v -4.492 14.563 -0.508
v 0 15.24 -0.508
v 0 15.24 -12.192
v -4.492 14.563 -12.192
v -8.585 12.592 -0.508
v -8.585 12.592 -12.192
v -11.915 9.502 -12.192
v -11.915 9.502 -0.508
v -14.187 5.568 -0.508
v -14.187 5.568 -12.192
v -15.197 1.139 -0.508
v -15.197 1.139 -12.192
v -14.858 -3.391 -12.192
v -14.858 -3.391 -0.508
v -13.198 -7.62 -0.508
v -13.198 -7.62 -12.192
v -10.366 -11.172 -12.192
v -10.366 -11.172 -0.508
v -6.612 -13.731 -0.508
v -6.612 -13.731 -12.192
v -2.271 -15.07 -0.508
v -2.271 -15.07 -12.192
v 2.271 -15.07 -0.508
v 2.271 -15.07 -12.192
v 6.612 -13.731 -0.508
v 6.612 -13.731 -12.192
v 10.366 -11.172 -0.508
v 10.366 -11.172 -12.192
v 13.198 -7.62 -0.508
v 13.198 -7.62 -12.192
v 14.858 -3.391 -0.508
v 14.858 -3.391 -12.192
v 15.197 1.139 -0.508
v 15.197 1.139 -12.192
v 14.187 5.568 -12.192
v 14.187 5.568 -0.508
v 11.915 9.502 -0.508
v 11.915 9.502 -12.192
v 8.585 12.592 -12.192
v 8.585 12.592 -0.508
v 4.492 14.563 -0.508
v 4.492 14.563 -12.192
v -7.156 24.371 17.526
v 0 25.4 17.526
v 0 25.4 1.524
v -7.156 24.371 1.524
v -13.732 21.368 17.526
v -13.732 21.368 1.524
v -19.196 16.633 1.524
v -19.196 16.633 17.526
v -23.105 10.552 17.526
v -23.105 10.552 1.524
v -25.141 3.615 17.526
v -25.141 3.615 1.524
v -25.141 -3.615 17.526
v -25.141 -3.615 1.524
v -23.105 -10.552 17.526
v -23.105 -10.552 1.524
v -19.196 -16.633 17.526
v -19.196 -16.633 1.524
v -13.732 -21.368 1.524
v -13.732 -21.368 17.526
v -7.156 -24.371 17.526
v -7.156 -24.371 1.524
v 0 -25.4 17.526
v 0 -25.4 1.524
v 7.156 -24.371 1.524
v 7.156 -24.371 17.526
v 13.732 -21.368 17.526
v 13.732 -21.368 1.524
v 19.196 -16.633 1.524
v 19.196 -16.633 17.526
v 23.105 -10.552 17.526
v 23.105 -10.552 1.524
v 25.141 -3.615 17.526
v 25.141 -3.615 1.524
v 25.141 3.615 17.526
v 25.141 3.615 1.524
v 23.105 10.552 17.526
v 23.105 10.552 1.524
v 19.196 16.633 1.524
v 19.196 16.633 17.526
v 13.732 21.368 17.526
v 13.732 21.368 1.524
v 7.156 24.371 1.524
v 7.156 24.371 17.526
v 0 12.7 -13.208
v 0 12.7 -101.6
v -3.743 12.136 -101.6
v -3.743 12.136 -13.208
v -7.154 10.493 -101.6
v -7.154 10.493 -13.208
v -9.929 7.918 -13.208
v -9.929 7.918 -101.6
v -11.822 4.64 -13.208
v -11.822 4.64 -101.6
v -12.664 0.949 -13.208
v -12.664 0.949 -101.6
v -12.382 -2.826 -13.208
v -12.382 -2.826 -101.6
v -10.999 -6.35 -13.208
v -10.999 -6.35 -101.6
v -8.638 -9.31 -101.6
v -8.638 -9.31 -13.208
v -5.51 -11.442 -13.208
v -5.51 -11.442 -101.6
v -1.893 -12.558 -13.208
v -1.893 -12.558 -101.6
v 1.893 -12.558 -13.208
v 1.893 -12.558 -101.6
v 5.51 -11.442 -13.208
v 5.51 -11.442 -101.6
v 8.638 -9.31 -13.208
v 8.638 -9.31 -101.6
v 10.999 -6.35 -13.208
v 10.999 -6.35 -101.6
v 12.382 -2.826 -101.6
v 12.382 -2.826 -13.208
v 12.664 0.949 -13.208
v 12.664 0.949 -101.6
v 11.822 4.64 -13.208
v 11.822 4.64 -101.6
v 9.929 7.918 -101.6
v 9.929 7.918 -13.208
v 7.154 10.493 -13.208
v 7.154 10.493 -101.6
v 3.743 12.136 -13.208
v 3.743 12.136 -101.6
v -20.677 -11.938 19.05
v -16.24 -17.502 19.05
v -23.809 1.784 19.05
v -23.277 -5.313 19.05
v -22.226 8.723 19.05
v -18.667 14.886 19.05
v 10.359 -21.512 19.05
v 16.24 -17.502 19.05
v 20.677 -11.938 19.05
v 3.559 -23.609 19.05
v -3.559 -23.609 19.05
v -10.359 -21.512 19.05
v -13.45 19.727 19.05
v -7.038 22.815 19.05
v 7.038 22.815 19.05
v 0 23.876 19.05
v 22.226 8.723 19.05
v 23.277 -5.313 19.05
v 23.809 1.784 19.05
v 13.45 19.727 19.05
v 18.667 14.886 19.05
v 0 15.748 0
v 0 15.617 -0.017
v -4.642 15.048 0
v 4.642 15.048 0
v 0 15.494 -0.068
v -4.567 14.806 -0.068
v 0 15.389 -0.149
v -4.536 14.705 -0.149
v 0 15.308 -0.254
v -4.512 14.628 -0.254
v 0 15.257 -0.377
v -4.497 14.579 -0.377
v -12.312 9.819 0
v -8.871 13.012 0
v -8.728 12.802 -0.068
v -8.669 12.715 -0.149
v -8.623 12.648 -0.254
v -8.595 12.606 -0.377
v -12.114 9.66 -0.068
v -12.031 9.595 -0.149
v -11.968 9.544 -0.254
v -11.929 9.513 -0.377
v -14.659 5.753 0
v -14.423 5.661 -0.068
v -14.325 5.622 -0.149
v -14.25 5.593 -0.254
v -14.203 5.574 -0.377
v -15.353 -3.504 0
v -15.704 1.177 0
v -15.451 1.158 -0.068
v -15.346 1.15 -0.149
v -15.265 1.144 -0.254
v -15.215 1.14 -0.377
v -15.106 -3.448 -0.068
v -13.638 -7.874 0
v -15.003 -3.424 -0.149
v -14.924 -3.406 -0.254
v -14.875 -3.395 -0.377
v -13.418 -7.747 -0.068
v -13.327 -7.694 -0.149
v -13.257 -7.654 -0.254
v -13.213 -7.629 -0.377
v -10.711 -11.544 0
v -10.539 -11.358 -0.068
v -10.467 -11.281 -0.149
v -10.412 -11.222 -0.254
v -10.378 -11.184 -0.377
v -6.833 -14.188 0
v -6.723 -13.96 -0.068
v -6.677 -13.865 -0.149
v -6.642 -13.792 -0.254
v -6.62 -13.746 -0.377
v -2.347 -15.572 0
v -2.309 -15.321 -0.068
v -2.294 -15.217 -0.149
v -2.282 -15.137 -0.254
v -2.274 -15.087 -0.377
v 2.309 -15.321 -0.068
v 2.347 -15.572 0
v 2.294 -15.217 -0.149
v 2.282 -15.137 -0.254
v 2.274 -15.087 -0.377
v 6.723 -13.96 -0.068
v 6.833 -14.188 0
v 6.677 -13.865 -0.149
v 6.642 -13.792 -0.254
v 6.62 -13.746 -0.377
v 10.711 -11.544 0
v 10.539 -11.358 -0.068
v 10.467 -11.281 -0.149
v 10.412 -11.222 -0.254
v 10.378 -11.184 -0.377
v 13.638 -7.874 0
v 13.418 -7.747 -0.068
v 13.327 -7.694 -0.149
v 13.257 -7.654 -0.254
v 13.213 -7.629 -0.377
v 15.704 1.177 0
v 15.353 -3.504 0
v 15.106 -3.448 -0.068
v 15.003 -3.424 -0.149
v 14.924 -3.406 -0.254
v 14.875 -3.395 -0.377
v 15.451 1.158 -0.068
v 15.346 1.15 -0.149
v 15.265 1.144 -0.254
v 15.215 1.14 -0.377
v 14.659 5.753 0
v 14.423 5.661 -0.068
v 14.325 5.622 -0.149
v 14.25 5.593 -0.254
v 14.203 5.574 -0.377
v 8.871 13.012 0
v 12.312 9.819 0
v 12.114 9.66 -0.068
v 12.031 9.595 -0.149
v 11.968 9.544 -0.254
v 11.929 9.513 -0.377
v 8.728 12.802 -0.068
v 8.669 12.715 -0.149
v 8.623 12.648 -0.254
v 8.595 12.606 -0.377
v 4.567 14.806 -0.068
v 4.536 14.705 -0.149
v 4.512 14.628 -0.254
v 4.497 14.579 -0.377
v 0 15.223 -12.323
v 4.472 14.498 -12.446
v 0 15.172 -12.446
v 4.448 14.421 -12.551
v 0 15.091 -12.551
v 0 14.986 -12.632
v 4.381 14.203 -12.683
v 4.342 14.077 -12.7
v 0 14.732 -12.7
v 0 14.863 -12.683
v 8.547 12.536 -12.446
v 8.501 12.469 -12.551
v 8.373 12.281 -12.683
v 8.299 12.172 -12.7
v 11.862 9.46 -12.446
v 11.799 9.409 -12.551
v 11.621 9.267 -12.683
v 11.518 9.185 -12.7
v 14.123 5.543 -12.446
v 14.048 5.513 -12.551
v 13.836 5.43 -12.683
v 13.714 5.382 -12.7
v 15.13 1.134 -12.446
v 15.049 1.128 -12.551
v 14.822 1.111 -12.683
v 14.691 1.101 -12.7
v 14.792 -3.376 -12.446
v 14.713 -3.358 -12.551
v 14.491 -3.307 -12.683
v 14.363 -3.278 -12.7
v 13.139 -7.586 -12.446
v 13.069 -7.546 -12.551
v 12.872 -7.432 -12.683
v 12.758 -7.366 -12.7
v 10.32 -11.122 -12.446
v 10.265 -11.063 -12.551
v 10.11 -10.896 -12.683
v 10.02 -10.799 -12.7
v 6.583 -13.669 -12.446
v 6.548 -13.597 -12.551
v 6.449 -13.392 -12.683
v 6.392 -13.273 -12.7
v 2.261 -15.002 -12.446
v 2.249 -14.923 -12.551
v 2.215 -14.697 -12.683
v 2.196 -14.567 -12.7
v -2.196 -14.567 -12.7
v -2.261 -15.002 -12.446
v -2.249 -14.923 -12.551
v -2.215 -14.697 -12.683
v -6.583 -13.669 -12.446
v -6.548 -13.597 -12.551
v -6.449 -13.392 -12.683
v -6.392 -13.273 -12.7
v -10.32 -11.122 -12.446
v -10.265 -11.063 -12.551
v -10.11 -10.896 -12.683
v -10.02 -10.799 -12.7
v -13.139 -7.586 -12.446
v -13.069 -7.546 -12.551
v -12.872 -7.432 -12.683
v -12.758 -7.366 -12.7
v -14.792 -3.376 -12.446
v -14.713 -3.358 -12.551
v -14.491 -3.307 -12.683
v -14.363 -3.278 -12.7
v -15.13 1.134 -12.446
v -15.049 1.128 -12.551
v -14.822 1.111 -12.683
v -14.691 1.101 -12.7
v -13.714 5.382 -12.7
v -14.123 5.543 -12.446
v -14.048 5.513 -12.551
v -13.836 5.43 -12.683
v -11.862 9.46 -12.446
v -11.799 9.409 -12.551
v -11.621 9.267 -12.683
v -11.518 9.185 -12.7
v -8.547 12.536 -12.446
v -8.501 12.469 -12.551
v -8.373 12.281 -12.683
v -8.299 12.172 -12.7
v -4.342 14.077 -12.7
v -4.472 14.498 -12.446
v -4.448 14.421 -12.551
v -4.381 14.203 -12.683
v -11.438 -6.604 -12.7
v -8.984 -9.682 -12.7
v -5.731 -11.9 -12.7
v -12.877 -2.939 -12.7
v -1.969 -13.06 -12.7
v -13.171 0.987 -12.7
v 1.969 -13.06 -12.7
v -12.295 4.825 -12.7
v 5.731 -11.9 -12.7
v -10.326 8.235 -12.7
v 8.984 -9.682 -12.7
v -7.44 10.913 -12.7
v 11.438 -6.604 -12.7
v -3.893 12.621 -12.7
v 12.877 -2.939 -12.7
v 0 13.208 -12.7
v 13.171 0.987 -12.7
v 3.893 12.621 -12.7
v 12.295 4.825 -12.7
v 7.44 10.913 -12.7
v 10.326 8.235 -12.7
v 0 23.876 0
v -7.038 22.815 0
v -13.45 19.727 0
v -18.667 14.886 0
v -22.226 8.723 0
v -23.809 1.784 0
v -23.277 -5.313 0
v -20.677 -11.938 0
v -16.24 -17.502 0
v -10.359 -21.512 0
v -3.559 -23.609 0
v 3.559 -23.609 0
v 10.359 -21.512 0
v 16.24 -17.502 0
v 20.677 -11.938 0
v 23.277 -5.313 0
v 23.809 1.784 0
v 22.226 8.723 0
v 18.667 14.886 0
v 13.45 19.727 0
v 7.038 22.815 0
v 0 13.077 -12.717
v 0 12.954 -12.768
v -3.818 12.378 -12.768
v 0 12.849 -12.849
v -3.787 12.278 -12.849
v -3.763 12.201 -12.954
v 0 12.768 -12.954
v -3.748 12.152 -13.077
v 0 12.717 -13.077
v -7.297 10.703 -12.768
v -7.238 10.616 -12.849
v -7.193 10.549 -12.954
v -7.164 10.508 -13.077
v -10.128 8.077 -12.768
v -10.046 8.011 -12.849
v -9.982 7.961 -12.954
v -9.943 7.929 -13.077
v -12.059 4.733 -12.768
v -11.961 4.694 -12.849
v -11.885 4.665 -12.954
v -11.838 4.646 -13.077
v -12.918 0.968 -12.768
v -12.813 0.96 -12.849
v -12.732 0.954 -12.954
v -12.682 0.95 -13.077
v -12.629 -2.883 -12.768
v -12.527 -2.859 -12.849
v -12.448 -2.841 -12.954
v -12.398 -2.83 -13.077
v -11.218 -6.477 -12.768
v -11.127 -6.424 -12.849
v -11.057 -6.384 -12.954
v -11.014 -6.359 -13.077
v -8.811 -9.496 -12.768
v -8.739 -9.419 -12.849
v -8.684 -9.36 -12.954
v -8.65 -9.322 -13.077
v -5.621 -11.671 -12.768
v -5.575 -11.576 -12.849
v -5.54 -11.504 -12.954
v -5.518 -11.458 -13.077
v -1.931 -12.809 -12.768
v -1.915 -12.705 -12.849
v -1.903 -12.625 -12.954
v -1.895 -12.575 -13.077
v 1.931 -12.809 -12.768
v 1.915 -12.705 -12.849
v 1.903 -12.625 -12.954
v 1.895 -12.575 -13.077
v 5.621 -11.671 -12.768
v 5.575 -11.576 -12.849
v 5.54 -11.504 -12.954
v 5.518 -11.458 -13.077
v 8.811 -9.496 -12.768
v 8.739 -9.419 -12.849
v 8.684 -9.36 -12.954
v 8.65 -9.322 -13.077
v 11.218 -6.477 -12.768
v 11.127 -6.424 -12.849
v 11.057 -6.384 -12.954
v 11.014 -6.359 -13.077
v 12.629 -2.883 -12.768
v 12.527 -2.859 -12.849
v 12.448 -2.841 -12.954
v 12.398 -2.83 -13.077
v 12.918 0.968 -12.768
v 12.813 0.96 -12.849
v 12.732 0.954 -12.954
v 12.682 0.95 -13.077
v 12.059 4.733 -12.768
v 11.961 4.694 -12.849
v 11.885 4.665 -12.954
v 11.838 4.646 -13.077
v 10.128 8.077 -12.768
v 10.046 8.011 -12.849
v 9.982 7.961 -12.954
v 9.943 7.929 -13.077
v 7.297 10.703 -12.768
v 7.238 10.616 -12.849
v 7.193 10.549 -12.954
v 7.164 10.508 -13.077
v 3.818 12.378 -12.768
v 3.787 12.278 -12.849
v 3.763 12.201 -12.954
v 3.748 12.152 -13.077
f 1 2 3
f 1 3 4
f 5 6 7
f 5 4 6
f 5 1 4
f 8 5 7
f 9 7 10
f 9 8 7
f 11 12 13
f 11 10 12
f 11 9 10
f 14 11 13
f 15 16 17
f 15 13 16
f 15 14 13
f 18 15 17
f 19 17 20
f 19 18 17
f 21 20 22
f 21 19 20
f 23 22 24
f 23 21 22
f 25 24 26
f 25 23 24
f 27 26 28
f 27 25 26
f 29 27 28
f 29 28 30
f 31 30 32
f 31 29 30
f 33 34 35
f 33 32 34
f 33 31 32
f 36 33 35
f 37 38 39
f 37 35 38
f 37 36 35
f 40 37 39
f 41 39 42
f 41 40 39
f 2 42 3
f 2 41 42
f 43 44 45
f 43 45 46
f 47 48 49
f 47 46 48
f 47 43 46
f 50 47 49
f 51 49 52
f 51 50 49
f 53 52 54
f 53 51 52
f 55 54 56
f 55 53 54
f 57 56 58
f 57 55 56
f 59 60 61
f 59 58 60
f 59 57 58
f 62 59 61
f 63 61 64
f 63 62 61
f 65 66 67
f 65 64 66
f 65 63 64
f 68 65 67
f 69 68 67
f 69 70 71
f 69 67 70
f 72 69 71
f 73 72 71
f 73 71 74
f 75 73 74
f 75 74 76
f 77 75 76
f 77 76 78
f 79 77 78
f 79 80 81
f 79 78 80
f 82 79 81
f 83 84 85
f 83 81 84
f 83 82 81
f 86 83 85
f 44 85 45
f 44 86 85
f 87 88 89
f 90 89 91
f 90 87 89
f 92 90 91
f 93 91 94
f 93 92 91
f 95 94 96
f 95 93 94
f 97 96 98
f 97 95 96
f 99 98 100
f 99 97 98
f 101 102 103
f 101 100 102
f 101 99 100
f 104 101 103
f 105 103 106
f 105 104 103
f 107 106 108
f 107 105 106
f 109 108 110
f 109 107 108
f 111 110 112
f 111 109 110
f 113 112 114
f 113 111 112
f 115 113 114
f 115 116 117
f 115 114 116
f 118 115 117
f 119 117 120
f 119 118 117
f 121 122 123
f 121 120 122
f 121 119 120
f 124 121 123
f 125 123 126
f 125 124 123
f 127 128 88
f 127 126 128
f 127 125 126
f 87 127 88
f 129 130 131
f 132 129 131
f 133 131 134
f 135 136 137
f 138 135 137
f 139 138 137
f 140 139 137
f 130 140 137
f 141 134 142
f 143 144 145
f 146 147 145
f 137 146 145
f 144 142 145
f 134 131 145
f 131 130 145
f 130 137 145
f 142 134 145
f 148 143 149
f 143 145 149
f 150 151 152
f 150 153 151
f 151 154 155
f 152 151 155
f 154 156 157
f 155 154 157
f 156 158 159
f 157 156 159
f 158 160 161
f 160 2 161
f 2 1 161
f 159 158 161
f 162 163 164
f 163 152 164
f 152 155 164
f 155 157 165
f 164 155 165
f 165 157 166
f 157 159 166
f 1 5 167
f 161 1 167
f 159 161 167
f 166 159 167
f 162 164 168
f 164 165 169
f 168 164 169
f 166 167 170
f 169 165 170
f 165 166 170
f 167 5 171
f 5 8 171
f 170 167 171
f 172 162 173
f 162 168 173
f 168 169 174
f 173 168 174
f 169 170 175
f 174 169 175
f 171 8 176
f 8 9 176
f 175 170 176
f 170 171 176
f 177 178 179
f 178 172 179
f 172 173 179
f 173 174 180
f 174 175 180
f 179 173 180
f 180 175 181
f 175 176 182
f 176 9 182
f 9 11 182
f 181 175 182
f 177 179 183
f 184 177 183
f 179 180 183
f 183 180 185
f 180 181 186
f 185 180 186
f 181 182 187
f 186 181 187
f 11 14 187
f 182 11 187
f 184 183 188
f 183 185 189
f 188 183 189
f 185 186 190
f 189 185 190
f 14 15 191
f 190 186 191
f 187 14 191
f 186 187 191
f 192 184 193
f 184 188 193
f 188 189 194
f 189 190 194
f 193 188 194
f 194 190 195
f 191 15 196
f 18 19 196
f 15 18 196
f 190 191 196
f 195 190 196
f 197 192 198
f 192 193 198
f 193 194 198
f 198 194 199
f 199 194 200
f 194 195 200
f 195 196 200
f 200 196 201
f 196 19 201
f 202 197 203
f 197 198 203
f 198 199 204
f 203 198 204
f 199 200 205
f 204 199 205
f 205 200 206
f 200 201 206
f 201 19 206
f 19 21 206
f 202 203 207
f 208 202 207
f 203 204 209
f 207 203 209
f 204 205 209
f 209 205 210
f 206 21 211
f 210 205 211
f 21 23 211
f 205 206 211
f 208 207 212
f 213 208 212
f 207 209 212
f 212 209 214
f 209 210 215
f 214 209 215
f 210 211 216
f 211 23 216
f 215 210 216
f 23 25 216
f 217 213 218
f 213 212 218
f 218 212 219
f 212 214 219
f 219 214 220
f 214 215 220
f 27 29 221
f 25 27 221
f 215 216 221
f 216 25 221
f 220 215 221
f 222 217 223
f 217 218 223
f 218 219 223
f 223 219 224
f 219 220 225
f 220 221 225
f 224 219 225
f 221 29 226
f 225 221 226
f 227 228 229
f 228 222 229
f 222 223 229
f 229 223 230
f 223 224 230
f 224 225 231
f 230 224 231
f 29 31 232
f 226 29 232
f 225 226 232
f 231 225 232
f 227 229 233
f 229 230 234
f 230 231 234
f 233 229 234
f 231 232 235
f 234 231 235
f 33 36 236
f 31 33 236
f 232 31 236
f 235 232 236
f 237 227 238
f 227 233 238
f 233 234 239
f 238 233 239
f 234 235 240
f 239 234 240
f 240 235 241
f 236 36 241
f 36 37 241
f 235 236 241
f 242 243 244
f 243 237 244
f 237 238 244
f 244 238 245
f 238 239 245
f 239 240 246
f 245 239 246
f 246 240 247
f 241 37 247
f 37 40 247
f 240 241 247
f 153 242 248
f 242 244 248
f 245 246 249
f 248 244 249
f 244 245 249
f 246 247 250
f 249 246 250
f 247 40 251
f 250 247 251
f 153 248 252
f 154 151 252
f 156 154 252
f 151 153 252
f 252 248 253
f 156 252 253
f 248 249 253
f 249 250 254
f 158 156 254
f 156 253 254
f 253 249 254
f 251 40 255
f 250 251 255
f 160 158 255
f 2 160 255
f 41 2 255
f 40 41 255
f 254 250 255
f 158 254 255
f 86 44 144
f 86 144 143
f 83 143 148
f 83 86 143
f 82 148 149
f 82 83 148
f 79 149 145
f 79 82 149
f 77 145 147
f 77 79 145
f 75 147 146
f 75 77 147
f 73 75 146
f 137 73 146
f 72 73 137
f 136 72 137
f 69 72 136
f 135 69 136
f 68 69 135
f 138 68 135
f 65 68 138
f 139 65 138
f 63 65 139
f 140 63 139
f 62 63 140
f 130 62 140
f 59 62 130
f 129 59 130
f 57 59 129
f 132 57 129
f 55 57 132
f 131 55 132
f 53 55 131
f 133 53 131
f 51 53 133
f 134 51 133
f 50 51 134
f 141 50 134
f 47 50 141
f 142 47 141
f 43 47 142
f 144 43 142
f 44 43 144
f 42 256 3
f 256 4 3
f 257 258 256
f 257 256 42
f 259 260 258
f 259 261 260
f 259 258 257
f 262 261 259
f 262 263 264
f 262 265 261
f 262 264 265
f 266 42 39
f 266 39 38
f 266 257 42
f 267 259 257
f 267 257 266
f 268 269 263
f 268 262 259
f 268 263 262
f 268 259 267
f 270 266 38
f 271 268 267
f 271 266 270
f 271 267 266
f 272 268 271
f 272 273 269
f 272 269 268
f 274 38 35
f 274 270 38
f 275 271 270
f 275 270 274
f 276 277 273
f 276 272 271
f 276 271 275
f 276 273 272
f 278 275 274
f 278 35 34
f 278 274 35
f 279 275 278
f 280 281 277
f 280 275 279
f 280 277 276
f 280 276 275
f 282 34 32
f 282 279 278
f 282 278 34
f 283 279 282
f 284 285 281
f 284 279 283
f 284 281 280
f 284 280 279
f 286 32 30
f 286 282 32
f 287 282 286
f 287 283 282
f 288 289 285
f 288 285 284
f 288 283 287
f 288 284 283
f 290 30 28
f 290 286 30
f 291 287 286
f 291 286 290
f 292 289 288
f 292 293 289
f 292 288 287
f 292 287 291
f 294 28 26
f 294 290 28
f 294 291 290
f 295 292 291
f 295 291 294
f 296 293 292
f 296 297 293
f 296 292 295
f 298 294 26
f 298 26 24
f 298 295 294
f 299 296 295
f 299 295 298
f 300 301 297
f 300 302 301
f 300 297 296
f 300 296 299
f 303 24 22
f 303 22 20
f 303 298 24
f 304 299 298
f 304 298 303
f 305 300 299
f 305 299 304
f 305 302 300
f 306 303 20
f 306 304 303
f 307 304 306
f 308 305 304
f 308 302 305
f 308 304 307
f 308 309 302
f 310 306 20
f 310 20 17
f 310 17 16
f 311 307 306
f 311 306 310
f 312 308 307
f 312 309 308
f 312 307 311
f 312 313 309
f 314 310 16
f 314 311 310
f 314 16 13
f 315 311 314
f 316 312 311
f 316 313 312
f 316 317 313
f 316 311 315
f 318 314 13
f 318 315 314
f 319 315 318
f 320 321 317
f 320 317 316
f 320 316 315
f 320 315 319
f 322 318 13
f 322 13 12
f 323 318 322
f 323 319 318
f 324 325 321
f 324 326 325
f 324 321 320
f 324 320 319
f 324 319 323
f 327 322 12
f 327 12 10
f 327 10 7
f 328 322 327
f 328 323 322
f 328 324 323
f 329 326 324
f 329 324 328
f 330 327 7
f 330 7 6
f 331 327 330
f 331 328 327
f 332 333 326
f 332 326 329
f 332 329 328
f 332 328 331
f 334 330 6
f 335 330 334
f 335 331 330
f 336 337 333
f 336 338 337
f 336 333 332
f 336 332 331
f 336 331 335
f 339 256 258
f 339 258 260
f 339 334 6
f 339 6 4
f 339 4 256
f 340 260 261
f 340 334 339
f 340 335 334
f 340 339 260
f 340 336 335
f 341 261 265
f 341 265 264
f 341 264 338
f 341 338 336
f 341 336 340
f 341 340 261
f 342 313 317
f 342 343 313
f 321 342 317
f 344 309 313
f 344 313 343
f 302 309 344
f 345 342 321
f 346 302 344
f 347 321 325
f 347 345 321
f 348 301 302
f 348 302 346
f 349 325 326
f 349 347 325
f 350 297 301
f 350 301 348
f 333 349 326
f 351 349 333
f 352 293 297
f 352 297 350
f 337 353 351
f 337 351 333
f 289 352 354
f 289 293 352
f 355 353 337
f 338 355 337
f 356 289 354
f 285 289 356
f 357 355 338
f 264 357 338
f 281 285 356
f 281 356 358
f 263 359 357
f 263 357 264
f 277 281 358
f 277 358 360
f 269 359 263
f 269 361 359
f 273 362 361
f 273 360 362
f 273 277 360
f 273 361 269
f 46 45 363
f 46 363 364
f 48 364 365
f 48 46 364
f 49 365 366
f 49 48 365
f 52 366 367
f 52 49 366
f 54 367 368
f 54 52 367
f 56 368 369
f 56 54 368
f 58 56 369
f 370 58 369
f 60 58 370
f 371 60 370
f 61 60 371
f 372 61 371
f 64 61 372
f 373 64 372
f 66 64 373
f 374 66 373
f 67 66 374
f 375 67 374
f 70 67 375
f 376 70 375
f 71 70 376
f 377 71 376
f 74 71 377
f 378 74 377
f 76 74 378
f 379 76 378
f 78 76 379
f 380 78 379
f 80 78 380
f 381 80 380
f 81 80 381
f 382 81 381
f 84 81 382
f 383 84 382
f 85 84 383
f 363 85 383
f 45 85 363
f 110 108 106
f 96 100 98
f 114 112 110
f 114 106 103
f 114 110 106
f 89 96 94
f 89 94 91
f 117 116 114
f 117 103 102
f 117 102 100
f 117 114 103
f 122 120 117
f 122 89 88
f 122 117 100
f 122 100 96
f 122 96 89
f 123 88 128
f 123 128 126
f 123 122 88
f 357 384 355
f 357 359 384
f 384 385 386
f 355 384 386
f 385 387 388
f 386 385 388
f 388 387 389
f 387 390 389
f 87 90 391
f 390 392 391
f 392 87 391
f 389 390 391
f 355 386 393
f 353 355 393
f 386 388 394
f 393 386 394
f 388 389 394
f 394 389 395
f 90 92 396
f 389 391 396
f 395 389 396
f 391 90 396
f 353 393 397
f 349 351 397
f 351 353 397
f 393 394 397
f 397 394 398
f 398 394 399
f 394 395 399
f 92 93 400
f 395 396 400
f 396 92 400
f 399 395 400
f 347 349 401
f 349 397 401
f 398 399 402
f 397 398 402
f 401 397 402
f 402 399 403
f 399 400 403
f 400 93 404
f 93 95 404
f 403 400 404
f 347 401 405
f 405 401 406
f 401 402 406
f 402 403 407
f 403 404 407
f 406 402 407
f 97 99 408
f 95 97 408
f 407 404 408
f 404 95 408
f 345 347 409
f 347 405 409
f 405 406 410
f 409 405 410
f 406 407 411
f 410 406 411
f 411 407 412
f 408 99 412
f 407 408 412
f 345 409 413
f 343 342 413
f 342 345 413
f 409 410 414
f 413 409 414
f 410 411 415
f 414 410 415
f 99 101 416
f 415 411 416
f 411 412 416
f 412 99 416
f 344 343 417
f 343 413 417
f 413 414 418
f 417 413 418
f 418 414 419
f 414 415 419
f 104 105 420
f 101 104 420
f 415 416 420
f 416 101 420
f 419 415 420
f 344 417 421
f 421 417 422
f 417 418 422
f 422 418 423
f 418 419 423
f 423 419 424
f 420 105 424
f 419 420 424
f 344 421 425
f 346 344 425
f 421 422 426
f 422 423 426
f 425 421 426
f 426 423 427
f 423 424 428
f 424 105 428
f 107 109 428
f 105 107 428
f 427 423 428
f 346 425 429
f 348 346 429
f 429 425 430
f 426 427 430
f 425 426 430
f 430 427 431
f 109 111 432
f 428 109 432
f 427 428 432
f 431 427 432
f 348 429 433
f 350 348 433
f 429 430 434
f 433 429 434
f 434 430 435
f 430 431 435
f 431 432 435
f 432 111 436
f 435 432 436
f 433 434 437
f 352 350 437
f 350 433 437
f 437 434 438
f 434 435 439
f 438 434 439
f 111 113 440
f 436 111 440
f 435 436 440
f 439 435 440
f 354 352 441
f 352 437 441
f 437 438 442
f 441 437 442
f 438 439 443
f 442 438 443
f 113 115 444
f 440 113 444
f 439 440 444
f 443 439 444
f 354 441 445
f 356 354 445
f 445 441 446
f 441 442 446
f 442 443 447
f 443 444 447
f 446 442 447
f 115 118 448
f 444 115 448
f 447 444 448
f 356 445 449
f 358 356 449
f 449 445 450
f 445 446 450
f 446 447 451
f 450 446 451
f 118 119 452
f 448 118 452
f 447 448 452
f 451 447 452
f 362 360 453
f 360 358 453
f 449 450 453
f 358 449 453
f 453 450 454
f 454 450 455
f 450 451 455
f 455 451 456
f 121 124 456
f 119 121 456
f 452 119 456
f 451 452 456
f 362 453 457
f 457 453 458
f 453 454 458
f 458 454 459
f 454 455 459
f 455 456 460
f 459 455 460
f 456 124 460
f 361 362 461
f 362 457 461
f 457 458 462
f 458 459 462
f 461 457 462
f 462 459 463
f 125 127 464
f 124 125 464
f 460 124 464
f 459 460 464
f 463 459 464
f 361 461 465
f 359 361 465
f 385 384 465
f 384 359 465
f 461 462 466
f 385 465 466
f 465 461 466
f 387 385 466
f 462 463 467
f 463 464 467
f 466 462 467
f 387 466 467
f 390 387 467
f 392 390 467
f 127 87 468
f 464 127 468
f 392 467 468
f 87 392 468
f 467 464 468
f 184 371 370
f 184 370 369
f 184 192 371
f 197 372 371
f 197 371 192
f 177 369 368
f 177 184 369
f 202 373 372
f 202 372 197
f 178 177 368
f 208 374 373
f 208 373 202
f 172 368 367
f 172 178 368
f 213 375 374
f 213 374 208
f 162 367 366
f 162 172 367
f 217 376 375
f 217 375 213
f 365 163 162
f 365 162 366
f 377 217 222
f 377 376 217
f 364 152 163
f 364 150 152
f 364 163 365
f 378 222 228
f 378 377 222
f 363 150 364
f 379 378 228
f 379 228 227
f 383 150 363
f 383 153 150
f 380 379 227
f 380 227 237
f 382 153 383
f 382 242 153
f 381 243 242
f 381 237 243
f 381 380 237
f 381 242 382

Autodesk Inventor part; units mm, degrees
ref_plane "YZ Plane" through (0, 0, 0) normal (1, 0, 0) x (0, 1, 0)
ref_plane "XZ Plane" through (0, 0, 0) normal (0, 1, 0) x (-1, 0, 0)
ref_plane "XY Plane" through (0, 0, 0) normal (0, 0, 1) x (1, 0, 0)
sketch "Sketch1" plane through (0, 0, 0) normal (1, 0, 0) x (0, 1, 0)
  line L0 (25.4, 0) -> (25.4, 19.05)
  line L1 (25.4, 19.05) -> (0, 19.05)
  line L2 (0, 19.05) -> (0, -101.6)
  line L3 (0, -101.6) -> (12.7, -101.6)
  line L4 (12.7, -101.6) -> (12.7, -12.7)
  line L5 (12.7, -12.7) -> (15.24, -12.7)
  line L6 (15.24, -12.7) -> (15.24, 0)
  line L7 (15.24, 0) -> (25.4, 0)
  point P0 (0, 0)
  dimension "d10" = 0.508
  dimension "d0" = 19.05
  dimension "d1" = 25.4
  dimension "d2" = 12.7
  dimension "d3" = 15.24
  dimension "d4" = 120.65
  dimension "d5" = 88.9
revolve "Revolution1" add sketch "Sketch1" angle 360 about axis through (0, 0, 19.05) along (0, 0, -1)
chamfer "Chamfer1" distance 1.524 angle 45 2 edges at (0, -25.4, 19.05) (0, -25.4, 0)
fillet "Fillet1" radius 0.508 3 edges at (0, -15.24, 0) (0, -15.24, -12.7) (0, -12.7, -12.7)
properties part number "Shoulder Screw"
